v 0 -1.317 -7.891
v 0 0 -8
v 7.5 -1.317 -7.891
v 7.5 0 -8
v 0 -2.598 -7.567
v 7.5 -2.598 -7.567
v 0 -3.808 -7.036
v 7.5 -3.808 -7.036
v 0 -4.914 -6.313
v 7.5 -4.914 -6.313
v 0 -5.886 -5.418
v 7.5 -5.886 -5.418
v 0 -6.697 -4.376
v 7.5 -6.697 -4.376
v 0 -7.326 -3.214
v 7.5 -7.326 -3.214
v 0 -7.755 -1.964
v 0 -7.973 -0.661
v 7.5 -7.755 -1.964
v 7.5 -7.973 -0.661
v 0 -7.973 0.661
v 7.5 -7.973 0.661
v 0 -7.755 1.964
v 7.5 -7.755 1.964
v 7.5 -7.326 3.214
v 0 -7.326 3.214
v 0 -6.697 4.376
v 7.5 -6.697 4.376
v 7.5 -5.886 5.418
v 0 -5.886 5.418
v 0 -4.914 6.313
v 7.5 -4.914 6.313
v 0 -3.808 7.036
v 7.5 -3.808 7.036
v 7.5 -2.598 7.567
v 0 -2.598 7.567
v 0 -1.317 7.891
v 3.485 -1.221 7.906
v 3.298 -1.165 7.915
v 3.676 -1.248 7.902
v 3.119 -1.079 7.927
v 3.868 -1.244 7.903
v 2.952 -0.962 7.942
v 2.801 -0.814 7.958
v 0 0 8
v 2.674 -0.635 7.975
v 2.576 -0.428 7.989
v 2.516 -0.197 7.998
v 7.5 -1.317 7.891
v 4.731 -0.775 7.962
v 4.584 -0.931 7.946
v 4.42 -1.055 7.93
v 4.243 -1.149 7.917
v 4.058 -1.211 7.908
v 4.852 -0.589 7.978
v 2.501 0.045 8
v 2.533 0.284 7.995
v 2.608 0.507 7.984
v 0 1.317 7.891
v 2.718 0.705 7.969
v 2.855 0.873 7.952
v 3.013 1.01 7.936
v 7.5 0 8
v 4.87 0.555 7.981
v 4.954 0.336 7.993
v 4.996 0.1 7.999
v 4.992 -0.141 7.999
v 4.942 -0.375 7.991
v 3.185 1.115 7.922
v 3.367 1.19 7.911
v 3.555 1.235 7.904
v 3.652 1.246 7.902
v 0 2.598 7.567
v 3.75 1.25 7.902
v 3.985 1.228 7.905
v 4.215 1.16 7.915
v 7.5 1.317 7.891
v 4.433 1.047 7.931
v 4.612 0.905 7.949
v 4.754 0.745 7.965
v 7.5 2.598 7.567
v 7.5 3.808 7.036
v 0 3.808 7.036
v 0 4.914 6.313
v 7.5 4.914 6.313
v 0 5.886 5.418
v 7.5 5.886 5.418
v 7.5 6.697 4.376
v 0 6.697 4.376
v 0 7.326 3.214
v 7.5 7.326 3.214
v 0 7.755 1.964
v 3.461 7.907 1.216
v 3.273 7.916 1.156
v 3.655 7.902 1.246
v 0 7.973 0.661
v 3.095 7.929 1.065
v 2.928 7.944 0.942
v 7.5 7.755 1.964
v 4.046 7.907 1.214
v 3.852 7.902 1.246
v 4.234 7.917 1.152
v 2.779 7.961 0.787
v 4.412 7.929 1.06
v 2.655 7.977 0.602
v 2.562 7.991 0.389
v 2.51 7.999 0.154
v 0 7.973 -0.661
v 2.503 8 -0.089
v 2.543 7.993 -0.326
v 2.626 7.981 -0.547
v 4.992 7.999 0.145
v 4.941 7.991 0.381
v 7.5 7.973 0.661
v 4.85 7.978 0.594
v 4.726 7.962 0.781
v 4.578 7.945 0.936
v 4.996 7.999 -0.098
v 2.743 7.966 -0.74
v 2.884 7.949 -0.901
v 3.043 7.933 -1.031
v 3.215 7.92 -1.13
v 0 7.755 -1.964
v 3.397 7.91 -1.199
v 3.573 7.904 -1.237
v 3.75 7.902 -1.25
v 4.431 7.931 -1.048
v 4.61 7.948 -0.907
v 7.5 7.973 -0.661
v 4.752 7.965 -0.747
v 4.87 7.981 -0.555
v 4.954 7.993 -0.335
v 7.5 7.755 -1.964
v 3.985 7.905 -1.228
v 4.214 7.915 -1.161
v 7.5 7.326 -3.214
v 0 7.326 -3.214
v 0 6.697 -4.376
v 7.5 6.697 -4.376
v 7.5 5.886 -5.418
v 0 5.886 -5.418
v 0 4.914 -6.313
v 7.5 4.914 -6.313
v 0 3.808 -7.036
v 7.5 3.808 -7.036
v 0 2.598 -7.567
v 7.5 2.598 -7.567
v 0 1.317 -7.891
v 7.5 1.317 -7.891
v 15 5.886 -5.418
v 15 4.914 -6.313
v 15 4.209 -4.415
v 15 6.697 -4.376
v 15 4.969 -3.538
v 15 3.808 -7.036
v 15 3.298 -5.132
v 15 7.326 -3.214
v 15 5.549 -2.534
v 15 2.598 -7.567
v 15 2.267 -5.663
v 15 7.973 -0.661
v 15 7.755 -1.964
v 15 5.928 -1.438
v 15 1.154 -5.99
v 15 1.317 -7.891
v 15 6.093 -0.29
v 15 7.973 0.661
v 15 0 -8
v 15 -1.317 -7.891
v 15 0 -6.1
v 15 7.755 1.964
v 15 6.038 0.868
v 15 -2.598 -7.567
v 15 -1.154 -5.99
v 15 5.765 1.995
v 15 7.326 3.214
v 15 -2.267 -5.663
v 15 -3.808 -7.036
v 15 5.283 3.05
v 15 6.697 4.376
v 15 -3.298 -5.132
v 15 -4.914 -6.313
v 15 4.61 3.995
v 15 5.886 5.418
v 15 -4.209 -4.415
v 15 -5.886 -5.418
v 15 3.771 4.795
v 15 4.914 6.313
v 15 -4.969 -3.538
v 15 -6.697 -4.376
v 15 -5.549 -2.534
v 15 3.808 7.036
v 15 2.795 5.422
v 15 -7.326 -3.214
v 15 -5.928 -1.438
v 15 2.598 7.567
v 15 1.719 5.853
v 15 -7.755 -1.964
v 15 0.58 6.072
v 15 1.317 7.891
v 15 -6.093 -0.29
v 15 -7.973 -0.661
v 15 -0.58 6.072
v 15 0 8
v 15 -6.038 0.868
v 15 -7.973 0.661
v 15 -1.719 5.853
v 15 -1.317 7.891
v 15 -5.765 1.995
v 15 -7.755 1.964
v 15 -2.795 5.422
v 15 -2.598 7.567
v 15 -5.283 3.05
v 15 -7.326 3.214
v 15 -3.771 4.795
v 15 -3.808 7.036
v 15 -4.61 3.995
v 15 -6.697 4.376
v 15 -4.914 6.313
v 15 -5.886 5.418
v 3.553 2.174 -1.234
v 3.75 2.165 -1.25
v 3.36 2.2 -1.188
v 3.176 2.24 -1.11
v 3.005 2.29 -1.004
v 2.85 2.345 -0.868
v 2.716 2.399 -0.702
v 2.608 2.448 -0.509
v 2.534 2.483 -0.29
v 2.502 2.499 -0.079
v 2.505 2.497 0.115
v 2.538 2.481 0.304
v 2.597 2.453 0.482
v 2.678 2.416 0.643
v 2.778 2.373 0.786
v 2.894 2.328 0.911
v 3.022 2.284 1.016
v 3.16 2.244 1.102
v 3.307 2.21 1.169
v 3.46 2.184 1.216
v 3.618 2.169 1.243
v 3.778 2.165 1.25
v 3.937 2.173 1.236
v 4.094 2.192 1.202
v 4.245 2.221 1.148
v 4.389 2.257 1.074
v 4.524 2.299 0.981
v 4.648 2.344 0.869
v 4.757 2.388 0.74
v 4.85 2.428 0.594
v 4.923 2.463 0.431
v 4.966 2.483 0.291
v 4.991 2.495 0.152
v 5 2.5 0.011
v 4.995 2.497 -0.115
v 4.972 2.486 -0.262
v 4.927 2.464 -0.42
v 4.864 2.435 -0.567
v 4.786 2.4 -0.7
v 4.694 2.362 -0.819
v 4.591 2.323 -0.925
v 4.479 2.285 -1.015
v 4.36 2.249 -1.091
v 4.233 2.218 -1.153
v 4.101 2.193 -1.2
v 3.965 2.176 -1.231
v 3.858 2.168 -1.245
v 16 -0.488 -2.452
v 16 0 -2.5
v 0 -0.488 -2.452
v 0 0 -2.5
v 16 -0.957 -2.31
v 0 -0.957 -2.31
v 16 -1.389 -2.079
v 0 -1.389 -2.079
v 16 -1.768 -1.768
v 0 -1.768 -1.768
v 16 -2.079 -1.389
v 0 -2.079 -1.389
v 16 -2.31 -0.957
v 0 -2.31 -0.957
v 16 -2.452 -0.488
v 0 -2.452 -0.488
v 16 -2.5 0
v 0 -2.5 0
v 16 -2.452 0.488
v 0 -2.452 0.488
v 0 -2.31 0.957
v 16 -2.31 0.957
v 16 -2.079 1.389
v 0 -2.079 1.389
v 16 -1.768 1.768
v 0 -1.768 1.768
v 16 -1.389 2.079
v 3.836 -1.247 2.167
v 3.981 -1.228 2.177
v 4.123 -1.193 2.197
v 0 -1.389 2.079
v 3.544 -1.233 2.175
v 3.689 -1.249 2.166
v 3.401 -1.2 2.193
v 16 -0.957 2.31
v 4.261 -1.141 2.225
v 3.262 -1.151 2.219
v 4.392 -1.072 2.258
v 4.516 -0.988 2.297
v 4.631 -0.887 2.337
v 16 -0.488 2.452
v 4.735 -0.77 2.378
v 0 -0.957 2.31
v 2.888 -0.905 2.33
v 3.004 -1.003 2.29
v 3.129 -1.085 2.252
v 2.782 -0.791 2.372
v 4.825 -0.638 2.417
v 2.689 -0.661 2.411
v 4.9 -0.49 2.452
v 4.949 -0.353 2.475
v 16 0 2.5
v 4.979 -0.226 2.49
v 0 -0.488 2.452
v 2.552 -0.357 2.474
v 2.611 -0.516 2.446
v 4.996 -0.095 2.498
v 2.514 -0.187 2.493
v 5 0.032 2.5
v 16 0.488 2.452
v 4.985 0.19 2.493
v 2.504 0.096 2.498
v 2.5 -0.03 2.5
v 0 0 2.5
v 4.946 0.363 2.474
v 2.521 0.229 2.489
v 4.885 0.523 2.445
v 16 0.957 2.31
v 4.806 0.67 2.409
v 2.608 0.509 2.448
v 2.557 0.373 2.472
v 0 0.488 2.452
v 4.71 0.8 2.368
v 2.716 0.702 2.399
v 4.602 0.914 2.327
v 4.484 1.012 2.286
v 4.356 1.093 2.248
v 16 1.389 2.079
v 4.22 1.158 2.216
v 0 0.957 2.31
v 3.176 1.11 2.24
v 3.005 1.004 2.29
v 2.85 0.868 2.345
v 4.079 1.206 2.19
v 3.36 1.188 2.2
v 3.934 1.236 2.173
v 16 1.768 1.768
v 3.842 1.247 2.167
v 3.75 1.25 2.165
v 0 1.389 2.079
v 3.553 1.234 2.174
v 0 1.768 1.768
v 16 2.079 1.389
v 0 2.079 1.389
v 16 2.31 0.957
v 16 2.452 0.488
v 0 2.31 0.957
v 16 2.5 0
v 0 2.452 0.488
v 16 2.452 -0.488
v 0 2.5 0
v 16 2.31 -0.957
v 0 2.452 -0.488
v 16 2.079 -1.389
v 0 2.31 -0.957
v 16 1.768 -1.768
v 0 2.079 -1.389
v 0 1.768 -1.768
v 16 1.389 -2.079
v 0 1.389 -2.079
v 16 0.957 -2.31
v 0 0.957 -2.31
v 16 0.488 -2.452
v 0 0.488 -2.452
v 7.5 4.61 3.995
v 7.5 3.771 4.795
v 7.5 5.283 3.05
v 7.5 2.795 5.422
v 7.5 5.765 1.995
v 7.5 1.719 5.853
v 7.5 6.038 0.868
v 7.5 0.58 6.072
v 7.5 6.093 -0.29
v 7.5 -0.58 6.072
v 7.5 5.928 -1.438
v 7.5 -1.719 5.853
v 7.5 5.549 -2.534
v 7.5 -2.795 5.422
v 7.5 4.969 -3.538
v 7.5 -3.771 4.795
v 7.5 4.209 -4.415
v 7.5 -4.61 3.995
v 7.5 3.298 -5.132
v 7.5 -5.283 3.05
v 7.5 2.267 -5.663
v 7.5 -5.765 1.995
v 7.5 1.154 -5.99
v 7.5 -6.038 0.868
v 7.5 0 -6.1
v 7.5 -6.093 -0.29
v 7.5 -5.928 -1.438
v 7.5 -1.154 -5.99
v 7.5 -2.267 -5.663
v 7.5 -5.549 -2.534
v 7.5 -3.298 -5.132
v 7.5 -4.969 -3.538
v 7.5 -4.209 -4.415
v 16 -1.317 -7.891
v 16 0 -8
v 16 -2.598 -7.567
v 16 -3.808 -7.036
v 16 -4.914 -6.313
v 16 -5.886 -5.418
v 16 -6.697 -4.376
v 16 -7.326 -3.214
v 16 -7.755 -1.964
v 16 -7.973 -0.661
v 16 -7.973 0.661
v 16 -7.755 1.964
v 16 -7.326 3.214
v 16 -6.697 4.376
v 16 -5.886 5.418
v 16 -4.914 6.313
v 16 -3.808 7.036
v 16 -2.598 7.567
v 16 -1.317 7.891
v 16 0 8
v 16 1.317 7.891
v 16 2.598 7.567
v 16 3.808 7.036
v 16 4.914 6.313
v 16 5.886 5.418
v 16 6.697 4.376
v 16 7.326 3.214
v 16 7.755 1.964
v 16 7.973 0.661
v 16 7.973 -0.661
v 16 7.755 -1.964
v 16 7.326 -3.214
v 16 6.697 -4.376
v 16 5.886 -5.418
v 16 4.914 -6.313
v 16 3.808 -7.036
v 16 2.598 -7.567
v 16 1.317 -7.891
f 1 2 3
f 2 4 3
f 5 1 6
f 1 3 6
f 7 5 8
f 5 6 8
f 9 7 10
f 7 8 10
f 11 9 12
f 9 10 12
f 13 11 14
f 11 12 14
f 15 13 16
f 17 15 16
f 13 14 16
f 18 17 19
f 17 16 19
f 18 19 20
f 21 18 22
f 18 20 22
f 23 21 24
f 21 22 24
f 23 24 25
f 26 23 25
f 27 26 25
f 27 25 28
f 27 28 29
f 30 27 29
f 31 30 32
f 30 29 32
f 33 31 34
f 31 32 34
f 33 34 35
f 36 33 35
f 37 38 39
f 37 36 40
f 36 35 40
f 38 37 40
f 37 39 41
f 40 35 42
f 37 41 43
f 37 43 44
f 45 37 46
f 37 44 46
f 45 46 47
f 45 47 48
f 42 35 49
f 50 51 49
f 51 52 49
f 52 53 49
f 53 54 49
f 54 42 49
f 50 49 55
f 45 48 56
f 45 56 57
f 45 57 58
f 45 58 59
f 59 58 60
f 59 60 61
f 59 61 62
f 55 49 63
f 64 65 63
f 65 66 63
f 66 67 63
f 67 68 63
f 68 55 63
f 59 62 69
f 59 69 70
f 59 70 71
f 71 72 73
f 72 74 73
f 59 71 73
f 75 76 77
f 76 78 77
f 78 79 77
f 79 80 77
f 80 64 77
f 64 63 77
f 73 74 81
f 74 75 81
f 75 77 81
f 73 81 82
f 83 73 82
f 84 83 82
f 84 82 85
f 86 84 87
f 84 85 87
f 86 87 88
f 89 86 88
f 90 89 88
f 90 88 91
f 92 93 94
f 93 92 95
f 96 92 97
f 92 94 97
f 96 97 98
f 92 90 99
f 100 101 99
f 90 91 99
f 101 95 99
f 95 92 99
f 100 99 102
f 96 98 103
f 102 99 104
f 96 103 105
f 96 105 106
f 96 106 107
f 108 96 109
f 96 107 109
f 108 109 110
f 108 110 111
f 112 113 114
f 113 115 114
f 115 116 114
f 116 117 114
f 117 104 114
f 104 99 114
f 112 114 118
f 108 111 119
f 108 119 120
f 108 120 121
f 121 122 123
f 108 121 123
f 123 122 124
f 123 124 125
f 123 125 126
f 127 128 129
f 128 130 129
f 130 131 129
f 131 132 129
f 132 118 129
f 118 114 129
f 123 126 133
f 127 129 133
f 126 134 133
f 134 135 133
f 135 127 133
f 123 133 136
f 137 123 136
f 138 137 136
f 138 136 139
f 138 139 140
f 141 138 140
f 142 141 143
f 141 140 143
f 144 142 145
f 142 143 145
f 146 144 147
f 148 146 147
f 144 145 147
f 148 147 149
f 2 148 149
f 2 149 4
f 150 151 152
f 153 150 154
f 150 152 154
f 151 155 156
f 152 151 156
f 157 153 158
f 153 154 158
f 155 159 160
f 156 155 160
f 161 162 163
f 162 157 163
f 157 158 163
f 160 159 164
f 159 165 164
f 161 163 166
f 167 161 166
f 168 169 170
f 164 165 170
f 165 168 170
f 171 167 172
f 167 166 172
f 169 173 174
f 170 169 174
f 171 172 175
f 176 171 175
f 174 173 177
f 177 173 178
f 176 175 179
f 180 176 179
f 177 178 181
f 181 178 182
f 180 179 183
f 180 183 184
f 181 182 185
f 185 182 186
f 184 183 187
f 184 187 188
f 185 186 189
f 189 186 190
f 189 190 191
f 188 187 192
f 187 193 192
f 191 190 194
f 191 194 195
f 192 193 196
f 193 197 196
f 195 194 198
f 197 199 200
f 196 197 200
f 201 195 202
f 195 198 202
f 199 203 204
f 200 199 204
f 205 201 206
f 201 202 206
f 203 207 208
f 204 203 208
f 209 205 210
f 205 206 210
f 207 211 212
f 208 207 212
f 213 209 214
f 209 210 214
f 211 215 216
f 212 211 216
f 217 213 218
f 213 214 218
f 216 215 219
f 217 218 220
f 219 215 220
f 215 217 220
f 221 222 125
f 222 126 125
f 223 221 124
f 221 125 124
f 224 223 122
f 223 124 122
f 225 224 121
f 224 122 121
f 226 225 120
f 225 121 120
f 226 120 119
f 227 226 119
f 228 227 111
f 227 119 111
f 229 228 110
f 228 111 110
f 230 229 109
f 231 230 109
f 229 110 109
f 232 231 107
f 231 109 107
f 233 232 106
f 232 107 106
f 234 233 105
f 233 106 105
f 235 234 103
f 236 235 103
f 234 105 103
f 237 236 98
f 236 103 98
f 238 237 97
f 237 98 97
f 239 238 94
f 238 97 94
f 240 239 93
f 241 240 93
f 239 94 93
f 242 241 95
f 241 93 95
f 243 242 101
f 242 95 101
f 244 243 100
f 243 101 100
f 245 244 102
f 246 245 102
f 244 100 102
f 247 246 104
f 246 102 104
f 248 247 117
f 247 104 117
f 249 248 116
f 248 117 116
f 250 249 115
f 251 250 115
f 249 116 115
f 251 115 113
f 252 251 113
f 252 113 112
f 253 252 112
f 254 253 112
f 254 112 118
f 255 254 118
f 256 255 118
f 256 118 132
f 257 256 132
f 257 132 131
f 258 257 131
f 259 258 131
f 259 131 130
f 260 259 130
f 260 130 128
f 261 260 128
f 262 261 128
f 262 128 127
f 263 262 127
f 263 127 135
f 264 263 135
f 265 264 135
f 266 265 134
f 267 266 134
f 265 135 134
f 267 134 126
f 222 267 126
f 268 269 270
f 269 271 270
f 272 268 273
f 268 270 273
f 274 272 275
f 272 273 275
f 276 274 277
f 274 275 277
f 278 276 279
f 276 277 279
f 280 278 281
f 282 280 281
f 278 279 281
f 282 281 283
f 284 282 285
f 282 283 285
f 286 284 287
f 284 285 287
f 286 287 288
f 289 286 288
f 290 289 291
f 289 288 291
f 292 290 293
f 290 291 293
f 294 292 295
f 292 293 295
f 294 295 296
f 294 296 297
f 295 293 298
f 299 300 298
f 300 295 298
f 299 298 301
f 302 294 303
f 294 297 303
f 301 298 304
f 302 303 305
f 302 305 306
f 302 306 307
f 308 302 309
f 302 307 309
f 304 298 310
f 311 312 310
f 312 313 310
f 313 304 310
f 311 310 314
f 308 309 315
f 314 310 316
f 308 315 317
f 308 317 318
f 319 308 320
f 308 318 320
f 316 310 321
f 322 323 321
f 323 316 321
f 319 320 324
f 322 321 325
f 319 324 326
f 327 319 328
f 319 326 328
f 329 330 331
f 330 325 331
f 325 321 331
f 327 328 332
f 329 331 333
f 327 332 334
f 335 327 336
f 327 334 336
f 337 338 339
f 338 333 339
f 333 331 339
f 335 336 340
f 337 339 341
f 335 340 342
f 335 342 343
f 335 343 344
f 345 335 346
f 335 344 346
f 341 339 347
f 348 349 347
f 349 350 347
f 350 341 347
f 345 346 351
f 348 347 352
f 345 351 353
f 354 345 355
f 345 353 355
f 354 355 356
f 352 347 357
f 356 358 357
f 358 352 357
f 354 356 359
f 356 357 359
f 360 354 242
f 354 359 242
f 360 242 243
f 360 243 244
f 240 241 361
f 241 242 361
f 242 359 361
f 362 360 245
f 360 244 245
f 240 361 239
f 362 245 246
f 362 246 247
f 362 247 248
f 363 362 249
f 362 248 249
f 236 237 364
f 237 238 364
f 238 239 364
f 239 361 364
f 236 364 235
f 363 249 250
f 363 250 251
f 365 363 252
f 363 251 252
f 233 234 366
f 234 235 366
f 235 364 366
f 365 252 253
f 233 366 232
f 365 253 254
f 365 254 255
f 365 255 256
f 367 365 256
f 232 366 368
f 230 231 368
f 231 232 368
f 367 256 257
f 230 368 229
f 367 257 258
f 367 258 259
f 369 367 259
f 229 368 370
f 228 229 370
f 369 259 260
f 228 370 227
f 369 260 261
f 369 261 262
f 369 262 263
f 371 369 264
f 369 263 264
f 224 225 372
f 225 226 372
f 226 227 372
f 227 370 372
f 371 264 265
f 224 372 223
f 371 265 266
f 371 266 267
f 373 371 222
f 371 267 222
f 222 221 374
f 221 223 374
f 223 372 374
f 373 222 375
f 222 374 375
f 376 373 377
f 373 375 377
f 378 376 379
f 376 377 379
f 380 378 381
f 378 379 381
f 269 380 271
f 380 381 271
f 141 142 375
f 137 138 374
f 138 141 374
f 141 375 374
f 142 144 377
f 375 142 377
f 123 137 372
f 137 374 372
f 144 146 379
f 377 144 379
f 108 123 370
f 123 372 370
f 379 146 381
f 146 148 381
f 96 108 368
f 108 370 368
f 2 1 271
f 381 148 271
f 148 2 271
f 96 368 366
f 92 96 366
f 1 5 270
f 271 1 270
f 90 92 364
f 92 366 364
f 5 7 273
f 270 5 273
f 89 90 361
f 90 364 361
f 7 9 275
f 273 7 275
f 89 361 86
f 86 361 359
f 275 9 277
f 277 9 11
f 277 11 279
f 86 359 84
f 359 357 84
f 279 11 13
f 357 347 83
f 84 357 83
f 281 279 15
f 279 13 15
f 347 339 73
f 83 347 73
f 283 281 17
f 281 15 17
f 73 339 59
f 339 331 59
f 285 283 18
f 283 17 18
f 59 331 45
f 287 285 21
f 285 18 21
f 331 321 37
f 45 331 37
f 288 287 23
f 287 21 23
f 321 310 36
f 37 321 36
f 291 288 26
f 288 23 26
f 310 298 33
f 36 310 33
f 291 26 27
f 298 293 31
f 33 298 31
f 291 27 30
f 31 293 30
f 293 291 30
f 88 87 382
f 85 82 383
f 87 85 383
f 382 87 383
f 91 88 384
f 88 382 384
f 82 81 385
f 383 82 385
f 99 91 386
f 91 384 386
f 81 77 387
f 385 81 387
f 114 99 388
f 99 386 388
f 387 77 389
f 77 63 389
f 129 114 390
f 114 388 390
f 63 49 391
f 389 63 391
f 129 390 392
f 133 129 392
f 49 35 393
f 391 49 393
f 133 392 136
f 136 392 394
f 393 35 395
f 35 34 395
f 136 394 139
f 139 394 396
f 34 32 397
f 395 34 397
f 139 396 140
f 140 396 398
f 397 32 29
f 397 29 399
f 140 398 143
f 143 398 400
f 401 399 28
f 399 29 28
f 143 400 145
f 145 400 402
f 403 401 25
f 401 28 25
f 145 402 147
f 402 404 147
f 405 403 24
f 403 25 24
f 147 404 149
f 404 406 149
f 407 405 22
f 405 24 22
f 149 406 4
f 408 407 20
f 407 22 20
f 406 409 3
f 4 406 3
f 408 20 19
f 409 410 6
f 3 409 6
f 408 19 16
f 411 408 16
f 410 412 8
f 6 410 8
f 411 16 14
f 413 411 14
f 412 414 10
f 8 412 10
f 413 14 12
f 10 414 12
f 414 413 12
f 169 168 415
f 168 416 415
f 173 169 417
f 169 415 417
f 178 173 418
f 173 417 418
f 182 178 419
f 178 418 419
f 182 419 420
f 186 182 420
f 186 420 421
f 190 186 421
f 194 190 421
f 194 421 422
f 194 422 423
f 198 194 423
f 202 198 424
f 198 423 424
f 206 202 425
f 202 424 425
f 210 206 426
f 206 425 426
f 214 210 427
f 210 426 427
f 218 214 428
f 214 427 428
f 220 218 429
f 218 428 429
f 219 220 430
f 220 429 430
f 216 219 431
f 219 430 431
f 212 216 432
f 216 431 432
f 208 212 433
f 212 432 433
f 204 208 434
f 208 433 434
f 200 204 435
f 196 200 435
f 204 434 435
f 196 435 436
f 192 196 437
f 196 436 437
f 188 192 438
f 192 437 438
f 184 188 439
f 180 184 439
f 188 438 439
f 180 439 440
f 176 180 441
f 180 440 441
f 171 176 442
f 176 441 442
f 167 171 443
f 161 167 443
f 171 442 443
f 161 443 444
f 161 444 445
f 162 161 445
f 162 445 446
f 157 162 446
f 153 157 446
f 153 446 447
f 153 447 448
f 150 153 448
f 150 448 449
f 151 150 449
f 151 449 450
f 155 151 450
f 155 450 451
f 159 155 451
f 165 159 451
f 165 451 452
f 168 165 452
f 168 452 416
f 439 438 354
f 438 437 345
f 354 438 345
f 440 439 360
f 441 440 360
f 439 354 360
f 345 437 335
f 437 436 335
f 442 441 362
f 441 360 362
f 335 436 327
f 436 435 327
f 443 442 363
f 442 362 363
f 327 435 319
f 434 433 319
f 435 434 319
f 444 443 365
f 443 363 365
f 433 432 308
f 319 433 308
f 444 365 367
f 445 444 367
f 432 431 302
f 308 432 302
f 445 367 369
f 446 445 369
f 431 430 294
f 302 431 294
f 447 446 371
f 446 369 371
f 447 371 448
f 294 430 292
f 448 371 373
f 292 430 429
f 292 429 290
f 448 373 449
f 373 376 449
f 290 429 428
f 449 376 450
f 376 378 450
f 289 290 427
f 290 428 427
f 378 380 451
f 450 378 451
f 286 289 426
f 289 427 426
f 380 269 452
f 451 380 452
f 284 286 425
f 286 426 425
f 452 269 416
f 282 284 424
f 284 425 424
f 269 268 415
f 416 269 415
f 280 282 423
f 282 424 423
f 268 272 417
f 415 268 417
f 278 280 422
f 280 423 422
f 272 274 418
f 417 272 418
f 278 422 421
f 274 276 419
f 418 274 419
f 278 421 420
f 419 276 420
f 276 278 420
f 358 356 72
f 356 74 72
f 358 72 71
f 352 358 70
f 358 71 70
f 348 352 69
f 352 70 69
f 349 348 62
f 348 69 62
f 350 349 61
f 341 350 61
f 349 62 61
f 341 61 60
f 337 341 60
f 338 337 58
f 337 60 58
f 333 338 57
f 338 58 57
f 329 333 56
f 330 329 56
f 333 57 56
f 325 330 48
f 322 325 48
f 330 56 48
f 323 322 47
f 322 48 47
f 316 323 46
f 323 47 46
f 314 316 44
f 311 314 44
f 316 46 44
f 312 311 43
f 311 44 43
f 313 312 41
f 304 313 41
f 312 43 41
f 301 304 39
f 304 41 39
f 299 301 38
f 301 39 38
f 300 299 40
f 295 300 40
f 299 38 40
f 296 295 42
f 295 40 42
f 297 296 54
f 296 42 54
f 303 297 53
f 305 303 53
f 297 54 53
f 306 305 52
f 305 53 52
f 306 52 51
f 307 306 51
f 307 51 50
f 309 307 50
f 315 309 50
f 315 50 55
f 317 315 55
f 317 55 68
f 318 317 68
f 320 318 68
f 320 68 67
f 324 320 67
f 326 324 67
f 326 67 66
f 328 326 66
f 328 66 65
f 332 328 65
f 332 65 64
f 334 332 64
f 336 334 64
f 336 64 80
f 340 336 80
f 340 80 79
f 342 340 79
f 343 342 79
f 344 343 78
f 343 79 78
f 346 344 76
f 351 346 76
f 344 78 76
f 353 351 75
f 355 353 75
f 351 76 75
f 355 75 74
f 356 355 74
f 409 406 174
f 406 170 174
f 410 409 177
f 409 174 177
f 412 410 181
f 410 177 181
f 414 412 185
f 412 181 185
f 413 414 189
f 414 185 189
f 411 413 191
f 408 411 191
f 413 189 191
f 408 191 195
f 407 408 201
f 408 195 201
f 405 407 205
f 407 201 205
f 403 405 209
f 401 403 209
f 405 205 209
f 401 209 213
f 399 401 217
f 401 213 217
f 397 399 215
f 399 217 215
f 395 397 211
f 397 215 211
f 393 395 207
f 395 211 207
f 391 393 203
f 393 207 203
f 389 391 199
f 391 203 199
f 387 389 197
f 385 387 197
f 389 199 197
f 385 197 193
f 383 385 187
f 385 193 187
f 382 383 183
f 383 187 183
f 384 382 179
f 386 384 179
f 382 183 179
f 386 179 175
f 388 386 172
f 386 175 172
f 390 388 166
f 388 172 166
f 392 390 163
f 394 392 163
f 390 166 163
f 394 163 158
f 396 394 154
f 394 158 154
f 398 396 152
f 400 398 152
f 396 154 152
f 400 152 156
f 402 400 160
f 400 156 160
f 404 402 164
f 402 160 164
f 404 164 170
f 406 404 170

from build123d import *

# Parameters (mm, degrees)
SKETCH2_W = 1.25
SKETCH2_H = 8
SKETCH4_W = 1.25
SKETCH4_H = 8


with BuildPart() as part:
    # Sketch1 → Revolve1 (revolve)
    with BuildSketch(Plane.XY, mode=Mode.PRIVATE) as revolve1_sk:
        Polygon((0, 2.5), (0, 8), (7.5, 8), (7.5, 6.1), (15, 6.1), (15, 8), (16, 8), (16, 2.5), align=None)
    revolve(revolve1_sk.sketch.rotate(Axis((0, 0, 0), (-1, 0, 0)), 90), axis=Axis((0, 0, 0), (-1, 0, 0)))

    # Sketch2 → M3x0.5 Tapped Hole1 (revolve, cut)
    with BuildSketch(Plane(origin=(3.75, 0, 0), x_dir=(0, 0, -1), z_dir=(1, 0, 0))):
        with Locations((0.625, 4)):
            Rectangle(SKETCH2_W, SKETCH2_H)
    revolve(axis=Axis((3.75, -6.35, 0), (0, 1, 0)), mode=Mode.SUBTRACT)

    # Sketch4 → M3x0.5 Tapped Hole2 (revolve, cut)
    with BuildSketch(Plane.YZ.offset(3.75)):
        with Locations((0.625, 4)):
            Rectangle(SKETCH4_W, SKETCH4_H)
    revolve(axis=Axis((3.75, 0, -6.35), (0, 0, 1)), mode=Mode.SUBTRACT)


solid = part.part
